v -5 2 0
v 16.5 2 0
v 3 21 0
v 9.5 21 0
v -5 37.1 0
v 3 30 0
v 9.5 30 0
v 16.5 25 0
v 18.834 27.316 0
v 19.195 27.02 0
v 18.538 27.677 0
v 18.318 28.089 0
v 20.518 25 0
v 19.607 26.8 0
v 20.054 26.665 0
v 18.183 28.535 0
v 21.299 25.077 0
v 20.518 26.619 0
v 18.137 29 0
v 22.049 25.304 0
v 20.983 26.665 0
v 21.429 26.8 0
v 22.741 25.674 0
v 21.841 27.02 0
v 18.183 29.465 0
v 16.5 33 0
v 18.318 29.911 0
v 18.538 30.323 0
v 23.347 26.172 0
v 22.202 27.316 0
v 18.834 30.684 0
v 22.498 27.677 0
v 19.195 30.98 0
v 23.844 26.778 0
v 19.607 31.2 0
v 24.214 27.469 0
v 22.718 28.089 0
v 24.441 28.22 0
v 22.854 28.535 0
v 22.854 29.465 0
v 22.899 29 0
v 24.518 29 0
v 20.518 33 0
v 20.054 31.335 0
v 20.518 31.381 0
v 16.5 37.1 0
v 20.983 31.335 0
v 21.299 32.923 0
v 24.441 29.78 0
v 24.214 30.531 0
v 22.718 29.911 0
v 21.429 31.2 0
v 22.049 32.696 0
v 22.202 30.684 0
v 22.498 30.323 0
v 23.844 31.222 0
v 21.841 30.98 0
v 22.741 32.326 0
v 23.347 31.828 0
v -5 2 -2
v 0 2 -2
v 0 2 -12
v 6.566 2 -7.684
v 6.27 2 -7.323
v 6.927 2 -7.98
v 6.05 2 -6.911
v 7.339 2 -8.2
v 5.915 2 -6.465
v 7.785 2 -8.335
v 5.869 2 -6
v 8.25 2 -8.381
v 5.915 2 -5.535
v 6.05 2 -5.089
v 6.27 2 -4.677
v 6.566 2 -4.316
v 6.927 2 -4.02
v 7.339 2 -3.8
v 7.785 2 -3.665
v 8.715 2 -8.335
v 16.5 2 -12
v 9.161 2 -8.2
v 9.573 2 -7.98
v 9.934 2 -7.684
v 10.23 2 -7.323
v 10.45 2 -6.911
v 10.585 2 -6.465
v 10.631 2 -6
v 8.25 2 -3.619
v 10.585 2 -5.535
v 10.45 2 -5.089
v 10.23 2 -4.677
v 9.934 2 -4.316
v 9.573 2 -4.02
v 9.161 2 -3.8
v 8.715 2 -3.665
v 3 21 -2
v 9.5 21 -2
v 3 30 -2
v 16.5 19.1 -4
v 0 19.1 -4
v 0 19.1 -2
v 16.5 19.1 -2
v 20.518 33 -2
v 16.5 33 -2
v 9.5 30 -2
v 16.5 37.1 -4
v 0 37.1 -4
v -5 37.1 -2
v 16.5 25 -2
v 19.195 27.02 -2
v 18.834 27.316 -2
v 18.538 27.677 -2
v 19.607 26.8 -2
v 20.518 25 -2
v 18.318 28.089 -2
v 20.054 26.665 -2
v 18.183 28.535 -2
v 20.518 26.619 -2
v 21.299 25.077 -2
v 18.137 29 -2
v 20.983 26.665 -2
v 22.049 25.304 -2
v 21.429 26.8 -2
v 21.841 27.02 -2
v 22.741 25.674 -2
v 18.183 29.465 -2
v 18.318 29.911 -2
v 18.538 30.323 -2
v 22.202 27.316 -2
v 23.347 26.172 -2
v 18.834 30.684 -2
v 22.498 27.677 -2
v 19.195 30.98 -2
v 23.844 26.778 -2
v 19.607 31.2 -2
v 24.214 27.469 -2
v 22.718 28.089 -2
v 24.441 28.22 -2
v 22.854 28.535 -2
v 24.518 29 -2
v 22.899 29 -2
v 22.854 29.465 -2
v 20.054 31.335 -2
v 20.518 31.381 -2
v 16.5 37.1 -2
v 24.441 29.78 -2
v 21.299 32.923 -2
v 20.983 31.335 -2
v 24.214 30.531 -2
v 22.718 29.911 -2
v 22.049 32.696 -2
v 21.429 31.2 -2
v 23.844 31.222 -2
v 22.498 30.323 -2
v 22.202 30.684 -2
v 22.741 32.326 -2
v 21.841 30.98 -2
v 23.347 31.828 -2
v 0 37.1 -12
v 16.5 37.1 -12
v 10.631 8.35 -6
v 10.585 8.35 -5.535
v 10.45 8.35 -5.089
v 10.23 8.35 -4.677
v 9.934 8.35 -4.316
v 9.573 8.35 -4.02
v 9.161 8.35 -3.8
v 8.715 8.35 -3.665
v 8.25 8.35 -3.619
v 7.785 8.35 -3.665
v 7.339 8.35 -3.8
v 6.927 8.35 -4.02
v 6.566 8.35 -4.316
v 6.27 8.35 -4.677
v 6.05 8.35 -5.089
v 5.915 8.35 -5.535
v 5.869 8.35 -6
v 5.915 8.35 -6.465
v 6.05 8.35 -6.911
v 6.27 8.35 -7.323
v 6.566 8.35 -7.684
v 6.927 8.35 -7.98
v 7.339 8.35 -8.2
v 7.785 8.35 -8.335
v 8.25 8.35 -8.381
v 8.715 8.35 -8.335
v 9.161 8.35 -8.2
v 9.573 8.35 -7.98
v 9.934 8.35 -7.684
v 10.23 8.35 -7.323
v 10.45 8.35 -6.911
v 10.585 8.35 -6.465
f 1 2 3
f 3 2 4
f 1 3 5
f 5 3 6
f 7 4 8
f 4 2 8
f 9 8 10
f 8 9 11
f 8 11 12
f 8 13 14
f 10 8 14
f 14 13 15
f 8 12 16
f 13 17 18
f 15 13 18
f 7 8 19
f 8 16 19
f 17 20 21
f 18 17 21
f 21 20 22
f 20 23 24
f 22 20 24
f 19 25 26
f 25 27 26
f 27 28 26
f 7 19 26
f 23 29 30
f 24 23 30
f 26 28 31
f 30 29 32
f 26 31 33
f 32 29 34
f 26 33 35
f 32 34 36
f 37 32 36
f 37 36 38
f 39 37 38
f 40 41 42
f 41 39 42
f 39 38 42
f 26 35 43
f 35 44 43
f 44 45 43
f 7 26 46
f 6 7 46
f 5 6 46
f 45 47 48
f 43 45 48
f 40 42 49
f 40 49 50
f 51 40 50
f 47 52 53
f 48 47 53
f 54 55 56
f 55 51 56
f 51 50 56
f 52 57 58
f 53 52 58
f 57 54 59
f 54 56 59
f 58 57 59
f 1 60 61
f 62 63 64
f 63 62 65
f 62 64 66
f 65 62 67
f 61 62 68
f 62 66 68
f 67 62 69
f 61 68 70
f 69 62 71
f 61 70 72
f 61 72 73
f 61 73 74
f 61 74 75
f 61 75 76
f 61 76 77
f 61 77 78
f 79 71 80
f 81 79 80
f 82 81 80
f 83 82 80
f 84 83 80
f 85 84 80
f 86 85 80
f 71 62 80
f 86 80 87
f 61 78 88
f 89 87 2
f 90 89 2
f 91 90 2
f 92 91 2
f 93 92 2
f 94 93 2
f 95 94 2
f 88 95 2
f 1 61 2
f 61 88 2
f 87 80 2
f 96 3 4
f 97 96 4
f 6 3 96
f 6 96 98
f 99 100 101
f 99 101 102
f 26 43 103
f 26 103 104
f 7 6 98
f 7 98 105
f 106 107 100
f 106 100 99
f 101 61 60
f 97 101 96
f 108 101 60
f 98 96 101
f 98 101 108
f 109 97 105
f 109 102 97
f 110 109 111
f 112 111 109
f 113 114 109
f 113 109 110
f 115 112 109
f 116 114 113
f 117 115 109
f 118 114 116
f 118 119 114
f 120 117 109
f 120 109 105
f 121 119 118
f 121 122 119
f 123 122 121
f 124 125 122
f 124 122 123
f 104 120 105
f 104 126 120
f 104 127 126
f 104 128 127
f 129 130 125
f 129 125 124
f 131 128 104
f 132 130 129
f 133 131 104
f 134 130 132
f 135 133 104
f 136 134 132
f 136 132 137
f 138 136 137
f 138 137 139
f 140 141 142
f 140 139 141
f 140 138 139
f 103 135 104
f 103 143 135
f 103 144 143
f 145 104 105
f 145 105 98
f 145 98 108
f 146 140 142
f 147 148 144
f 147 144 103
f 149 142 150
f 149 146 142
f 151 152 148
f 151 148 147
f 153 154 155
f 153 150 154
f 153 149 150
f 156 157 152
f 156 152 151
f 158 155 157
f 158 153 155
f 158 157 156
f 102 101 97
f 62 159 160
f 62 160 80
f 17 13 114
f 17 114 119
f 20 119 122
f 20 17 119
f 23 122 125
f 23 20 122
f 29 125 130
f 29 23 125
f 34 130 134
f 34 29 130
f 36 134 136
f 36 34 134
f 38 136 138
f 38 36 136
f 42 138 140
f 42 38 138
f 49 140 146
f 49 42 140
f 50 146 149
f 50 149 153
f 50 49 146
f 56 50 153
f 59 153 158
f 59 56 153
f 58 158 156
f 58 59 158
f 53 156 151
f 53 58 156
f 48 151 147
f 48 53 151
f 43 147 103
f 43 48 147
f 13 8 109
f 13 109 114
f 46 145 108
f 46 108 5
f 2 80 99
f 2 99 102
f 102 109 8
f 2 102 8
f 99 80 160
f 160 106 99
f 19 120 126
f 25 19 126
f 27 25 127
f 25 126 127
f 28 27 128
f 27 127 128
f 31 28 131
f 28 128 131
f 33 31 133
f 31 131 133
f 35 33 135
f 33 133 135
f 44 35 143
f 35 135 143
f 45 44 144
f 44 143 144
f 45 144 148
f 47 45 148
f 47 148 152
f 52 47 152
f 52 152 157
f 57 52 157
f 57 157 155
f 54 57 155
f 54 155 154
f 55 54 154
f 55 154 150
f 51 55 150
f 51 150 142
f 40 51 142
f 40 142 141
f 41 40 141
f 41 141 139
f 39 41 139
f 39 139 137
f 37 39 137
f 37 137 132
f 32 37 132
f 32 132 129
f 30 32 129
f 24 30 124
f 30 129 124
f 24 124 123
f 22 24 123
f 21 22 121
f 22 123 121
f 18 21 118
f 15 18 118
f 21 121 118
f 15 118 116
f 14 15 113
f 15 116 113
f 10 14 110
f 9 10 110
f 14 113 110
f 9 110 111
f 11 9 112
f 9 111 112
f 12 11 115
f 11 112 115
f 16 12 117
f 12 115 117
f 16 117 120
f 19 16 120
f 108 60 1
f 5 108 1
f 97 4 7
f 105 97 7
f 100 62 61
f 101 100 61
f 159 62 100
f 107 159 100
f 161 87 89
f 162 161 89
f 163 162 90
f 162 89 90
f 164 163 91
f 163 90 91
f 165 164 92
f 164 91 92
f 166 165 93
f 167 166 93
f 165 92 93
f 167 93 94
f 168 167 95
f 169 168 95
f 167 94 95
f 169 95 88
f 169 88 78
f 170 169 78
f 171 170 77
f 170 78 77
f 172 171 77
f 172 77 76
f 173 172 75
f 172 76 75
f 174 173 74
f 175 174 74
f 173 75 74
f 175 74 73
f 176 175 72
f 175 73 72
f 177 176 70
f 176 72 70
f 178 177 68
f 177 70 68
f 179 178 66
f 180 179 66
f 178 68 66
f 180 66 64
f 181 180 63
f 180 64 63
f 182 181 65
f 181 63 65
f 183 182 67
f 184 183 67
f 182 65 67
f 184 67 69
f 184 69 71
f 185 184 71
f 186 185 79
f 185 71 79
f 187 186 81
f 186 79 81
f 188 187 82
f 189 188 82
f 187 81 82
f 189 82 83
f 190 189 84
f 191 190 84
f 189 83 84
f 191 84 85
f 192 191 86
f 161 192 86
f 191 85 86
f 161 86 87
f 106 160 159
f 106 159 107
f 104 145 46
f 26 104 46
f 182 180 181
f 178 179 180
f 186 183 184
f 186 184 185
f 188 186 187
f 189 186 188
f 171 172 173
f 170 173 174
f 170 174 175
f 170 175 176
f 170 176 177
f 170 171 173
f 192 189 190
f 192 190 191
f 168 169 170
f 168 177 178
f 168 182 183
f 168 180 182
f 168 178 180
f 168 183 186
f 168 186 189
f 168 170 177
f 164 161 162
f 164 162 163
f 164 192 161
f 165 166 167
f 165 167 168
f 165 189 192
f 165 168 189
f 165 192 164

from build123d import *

# Parameters (mm, degrees)
BOSS_EXTRUDE4_DEPTH = 16.5
CUT_EXTRUDE2_DEPTH  = 1.5
CUT_EXTRUDE4_DEPTH  = 17.5
SKETCH6_W           = 12
SKETCH6_H           = 2
CUT_EXTRUDE5_DEPTH  = 17.5
BOSS_EXTRUDE5_DEPTH = 2
SKETCH10_R          = 2.38125
CUT_EXTRUDE6_DEPTH  = 13.606601718
CUT_EXTRUDE7_DEPTH  = 17.5
SKETCH12_R          = 2.38125
CUT_EXTRUDE8_DEPTH  = 6.35
SKETCH13_W          = 6.5
SKETCH13_H          = 9
CUT_EXTRUDE11_DEPTH = 2
SKETCH15_W          = 16.5
SKETCH15_H          = 2
CUT_EXTRUDE13_DEPTH = 18
SKETCH16_W          = 2
SKETCH16_H          = 35.1
BOSS_EXTRUDE6_DEPTH = 5


with BuildPart() as part:
    # Sketch1 → Boss-Extrude4 (new body)
    with BuildSketch(Plane(origin=(0, 0, 0), x_dir=(0, 0, -1), z_dir=(1, 0, 0))):
        Polygon((0, 0), (0, 37.1), (-10.606601718, 47.706601718), (12, 47.706601718), (12, 0), align=None)
    extrude(amount=BOSS_EXTRUDE4_DEPTH)

    # Sketch4 → Cut-Extrude2 (cut)
    with BuildSketch(Plane.ZY):
        Polygon((0, 37.1), (0, 47.706601718), (10.606601718, 47.706601718), align=None)
    extrude(amount=-CUT_EXTRUDE2_DEPTH, mode=Mode.SUBTRACT)

    # Sketch5 → Cut-Extrude4 (cut, through all)
    with BuildSketch(Plane(origin=(16.5, 0, 0), x_dir=(0, 0, -1), z_dir=(1, 0, 0))):
        Polygon((-3.566952421, 40.666952421), (-2.859845639, 39.959845639), (-1.799185468, 41.020505811), (0, 39.221320344), (0, 42.756854249), (-2.683068944, 45.439923194), (-4.450835897, 43.672156241), (-3.036622335, 42.257942678), (-4.097282506, 41.197282506), align=None)
    extrude(amount=-CUT_EXTRUDE4_DEPTH, mode=Mode.SUBTRACT)

    # Sketch6 → Cut-Extrude5 (cut, through all)
    with BuildSketch(Plane(origin=(16.5, 0, 0), x_dir=(0, 0, -1), z_dir=(1, 0, 0))):
        with Locations((6, 1)):
            Rectangle(SKETCH6_W, SKETCH6_H)
    extrude(amount=-CUT_EXTRUDE5_DEPTH, mode=Mode.SUBTRACT)

    # Sketch9 → Boss-Extrude5 (add)
    with BuildSketch(Plane.XY):
        with BuildLine():
            Line((16.5, 29), (16.5, 25))
            Line((16.5, 25), (20.518219338, 25))
            ThreePointArc((20.518219338, 25), (24.518219338, 29), (20.518219338, 33))
            Line((20.518219338, 33), (16.5, 33))
            Line((16.5, 33), (16.5, 29))
        make_face()
    extrude(amount=-BOSS_EXTRUDE5_DEPTH)

    # Sketch10 → Cut-Extrude6 (cut, through all)
    with BuildSketch(Plane(origin=(0, 0, -2), x_dir=(-1, 0, 0), z_dir=(0, 0, -1))):
        with Locations((-20.518219338, 29)):
            Circle(SKETCH10_R)
    extrude(amount=-CUT_EXTRUDE6_DEPTH, mode=Mode.SUBTRACT)

    # Sketch11 → Cut-Extrude7 (cut, through all)
    with BuildSketch(Plane(origin=(16.5, 0, 0), x_dir=(0, 0, -1), z_dir=(1, 0, 0))):
        Polygon((0, 37.1), (-10.606601718, 47.706601718), (12, 47.706601718), (12, 37.1), align=None)
    extrude(amount=-CUT_EXTRUDE7_DEPTH, mode=Mode.SUBTRACT)

    # Sketch12 → Cut-Extrude8 (cut)
    with BuildSketch(Plane.XZ.offset(-2)):
        with Locations((8.25, -6)):
            Circle(SKETCH12_R)
    extrude(amount=-CUT_EXTRUDE8_DEPTH, mode=Mode.SUBTRACT)

    # Sketch13 → Cut-Extrude11 (cut)
    with BuildSketch(Plane.XY):
        with Locations((6.25, 25.5)):
            Rectangle(SKETCH13_W, SKETCH13_H)
    extrude(amount=-CUT_EXTRUDE11_DEPTH, mode=Mode.SUBTRACT)

    # Sketch15 → Cut-Extrude13 (cut)
    with BuildSketch(Plane(origin=(0, 37.1, 0), x_dir=(1, 0, 0), z_dir=(0, 1, 0))):
        with Locations((8.25, 3)):
            Rectangle(SKETCH15_W, SKETCH15_H)
    extrude(amount=-CUT_EXTRUDE13_DEPTH, mode=Mode.SUBTRACT)

    # Sketch16 → Boss-Extrude6 (add)
    with BuildSketch(Plane.ZY):
        with Locations((-1, 19.55)):
            Rectangle(SKETCH16_W, SKETCH16_H)
    extrude(amount=BOSS_EXTRUDE6_DEPTH)


solid = part.part
